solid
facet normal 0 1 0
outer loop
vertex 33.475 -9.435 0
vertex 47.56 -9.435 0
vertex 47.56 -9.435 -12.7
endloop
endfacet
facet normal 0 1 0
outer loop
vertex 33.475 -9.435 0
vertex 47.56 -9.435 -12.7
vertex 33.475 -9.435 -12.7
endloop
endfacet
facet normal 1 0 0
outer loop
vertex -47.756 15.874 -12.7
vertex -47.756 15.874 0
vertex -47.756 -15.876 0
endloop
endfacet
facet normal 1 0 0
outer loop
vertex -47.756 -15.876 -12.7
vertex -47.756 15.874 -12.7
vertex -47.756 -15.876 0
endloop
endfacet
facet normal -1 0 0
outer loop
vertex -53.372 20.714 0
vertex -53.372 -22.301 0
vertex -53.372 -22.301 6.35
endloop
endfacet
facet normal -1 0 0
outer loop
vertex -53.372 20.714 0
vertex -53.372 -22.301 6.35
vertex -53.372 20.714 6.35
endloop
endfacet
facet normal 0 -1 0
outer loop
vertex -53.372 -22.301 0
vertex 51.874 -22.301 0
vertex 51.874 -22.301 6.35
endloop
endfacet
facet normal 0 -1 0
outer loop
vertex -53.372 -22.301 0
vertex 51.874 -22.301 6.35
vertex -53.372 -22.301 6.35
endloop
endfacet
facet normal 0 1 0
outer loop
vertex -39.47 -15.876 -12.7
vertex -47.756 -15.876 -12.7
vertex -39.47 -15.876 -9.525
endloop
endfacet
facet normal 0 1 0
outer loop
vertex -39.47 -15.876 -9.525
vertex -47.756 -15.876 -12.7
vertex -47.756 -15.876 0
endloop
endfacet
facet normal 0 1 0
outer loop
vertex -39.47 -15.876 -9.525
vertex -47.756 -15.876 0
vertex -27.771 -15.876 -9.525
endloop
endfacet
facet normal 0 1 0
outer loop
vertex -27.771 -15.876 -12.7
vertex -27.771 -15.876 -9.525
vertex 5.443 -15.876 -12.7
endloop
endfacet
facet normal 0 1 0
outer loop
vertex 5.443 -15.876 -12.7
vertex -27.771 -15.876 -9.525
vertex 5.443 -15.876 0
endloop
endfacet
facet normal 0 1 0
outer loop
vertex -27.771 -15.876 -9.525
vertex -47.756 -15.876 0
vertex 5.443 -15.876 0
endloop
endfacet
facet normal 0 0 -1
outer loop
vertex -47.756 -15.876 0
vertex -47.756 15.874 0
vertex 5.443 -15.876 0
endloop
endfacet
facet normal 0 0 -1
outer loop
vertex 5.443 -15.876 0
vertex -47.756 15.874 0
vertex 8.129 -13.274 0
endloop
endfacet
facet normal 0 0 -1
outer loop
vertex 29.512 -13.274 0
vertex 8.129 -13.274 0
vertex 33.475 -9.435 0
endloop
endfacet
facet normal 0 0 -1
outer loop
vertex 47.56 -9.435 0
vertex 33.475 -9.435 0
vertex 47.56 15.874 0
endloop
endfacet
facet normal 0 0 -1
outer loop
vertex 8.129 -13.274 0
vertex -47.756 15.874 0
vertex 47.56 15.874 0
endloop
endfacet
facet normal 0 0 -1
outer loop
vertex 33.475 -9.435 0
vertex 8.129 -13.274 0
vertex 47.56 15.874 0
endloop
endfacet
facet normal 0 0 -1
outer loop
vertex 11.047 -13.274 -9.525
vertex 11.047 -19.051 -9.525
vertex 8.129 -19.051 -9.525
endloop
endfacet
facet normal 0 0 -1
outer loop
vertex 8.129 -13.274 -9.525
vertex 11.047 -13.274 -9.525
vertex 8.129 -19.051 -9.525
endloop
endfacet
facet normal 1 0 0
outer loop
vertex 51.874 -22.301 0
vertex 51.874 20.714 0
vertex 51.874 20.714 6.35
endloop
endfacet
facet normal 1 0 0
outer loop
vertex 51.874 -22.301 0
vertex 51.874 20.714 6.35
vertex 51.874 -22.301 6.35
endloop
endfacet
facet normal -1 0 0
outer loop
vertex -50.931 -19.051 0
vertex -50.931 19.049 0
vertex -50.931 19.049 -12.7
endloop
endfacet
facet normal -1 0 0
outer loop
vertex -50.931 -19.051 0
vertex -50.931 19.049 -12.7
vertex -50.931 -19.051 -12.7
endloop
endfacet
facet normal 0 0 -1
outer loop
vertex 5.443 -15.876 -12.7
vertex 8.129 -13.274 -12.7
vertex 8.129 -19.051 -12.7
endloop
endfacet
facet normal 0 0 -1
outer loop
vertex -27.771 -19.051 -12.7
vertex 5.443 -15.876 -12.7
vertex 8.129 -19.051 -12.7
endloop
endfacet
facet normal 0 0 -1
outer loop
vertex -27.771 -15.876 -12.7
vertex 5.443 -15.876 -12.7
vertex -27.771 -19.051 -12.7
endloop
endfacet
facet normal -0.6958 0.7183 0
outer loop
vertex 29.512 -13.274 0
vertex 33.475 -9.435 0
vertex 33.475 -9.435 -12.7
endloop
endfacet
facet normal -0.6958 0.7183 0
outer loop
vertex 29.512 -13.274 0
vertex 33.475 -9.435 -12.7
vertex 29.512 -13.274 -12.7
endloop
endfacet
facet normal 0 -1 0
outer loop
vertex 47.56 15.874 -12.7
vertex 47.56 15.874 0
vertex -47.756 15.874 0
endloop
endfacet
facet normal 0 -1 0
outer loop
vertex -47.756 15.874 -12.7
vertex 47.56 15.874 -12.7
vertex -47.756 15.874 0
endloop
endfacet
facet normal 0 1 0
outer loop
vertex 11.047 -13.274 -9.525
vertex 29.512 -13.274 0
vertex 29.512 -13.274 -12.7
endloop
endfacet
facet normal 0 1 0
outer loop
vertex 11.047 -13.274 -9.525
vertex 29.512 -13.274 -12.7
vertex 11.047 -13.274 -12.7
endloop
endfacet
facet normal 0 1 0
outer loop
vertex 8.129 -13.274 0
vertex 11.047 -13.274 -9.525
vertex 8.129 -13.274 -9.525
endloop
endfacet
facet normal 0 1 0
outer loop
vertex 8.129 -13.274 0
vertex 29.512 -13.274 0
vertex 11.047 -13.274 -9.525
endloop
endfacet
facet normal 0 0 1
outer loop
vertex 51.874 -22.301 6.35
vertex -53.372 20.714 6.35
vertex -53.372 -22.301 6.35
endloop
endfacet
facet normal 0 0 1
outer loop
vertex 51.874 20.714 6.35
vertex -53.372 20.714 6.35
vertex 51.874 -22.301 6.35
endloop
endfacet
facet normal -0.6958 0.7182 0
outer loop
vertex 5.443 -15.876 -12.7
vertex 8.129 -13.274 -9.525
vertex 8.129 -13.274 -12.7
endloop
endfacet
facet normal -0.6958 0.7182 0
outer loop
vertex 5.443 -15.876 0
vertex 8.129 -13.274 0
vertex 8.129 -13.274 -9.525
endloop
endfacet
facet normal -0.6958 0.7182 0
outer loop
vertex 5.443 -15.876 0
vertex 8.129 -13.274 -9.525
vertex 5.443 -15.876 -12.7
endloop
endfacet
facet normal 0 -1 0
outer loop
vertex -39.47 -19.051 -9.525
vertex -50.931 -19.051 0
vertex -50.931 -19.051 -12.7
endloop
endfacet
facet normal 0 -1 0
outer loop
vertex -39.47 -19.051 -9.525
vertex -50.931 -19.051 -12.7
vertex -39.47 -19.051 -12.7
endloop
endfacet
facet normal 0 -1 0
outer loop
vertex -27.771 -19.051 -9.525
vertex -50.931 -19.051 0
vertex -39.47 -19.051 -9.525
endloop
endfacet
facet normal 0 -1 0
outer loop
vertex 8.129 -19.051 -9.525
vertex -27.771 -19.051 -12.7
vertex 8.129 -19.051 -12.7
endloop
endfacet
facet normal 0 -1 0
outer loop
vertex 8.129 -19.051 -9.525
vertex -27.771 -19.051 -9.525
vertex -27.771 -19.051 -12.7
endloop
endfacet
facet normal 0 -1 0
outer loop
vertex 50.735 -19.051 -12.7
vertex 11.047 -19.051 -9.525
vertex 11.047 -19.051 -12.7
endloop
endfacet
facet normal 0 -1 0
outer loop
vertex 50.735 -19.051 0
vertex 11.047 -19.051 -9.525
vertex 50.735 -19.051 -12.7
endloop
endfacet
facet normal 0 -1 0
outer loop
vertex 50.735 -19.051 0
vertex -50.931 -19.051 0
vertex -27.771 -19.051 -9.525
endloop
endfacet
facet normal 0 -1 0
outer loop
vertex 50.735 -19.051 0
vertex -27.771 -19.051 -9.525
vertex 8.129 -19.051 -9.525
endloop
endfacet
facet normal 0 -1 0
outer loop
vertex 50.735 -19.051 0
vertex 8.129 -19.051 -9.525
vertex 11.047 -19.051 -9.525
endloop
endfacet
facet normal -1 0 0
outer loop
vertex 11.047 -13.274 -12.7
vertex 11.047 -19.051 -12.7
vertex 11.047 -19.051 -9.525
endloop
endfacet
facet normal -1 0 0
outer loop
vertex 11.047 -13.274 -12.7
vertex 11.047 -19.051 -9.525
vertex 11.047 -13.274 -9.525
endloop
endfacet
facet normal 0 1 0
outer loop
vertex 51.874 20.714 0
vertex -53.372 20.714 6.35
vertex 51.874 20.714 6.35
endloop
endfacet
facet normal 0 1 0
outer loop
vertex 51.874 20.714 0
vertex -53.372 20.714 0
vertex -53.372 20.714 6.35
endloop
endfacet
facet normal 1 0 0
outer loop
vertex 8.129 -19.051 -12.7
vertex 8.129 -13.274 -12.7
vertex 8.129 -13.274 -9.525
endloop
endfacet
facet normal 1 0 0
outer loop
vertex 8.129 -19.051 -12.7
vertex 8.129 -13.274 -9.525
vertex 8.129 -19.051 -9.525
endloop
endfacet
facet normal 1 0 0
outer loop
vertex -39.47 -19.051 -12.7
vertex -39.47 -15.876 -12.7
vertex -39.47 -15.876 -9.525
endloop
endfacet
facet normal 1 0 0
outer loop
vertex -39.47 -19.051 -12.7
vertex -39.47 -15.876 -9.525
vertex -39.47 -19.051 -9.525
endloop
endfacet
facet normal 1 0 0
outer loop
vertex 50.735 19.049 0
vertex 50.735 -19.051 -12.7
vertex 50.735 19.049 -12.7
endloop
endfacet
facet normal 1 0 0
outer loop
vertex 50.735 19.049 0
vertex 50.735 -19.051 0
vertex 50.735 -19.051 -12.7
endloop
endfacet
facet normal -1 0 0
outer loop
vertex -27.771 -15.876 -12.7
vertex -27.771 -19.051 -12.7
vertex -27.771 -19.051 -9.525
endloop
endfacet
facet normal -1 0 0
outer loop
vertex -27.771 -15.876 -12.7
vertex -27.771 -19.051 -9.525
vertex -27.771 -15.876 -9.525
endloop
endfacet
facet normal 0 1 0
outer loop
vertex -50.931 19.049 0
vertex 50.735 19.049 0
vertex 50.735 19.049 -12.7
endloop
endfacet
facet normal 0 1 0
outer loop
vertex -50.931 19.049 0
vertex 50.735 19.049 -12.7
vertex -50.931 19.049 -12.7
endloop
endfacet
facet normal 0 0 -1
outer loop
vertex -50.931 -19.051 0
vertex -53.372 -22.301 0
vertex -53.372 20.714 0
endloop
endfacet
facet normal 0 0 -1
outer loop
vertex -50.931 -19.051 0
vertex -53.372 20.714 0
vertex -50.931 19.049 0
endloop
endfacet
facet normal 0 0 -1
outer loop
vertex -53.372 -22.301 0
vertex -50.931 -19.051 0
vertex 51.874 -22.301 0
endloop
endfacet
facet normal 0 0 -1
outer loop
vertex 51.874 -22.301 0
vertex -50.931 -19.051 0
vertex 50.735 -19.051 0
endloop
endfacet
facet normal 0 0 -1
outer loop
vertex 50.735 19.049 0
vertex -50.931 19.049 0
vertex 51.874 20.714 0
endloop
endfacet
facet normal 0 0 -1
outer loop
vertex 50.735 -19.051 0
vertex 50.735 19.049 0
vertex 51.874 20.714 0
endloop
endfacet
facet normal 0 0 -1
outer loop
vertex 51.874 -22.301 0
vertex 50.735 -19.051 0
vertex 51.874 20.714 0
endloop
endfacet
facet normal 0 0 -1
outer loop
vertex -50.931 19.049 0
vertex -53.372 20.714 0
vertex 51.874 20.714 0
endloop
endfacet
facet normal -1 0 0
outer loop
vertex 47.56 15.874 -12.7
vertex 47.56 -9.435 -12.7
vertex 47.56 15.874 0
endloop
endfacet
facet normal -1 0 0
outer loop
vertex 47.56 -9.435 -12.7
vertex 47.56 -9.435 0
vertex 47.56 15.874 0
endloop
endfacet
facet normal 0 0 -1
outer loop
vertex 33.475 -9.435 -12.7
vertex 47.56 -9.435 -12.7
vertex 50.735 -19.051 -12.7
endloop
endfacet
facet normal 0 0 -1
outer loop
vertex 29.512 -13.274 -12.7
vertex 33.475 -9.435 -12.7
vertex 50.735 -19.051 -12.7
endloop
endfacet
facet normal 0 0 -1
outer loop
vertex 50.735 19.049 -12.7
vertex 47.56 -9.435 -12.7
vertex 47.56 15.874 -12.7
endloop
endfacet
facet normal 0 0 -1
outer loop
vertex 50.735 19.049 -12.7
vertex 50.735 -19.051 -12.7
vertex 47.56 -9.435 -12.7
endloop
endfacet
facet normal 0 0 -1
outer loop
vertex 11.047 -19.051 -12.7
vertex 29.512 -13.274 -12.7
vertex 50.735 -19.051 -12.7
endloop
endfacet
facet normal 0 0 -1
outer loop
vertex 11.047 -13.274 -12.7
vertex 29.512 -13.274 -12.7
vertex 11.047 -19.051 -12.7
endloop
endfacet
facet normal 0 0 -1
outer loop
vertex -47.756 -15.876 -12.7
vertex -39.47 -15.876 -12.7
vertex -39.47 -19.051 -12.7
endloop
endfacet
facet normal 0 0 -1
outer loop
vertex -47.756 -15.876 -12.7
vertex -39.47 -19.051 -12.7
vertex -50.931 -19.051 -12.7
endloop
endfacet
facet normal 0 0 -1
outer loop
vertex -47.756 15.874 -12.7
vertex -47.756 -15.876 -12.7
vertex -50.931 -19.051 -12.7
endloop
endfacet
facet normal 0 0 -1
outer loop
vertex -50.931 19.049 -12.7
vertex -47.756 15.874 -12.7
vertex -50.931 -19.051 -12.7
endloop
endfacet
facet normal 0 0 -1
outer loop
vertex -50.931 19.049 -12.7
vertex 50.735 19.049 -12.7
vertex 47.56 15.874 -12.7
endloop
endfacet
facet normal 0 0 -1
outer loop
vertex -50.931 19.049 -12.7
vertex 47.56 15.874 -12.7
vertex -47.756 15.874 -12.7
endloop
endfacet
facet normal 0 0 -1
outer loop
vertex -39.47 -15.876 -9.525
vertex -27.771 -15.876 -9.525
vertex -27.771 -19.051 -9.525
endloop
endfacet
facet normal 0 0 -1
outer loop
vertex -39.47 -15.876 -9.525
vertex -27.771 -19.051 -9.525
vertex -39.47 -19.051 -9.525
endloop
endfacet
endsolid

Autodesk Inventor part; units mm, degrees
ref_plane "YZ Plane" through (0, 0, 0) normal (1, 0, 0) x (0, 1, 0)
ref_plane "XZ Plane" through (0, 0, 0) normal (0, 1, 0) x (-1, 0, 0)
ref_plane "XY Plane" through (0, 0, 0) normal (0, 0, 1) x (1, 0, 0)
sketch "Sketch1" plane through (0, 0, 0) normal (0, 0, 1) x (1, 0, 0)
  line L0 (-53.3723, 20.7143) -> (51.8738, 20.7143)
  line L1 (51.8738, 20.7143) -> (51.8738, -22.3009)
  line L2 (51.8738, -22.3009) -> (-53.3723, -22.3009)
  line L3 (-53.3723, -22.3009) -> (-53.3723, 20.7143)
  point P0 (0, 0)
extrude "Extrusion1" add sketch "Sketch1" along normal blind 6.35
sketch "Sketch2" plane through (0, 0, 0) normal (0, 0, -1) x (-1, 0, 0)
  line L0 (-51.8738, 20.7143) -> (53.3723, 20.7143)
  line L1 (53.3723, 20.7143) -> (53.3723, -22.3009)
  line L2 (53.3723, -22.3009) -> (-51.8738, -22.3009)
  line L3 (-51.8738, -22.3009) -> (-51.8738, 20.7143)
  line L4 (-47.5602, 15.8741) -> (47.7562, 15.8741)
  line L5 (47.7562, 15.8741) -> (47.7562, -15.8759)
  line L6 (47.7562, -15.8759) -> (-47.5602, -15.8759)
  line L7 (-47.5602, -15.8759) -> (-47.5602, 15.8741)
  line L8 (-50.7352, 19.0491) -> (50.9312, 19.0491)
  line L9 (50.9312, 19.0491) -> (50.9312, -19.0509)
  line L10 (50.9312, -19.0509) -> (-50.7352, -19.0509)
  line L11 (-50.7352, -19.0509) -> (-50.7352, 19.0491)
  line L12 (53.3723, -22.3009) -> (53.3723, 20.7143) projected
  line L13 (-47.5602, -9.4351) -> (-33.4749, -9.4351)
  line L14 (-33.4749, -9.4351) -> (-29.5119, -13.2742)
  line L15 (-29.5119, -13.2742) -> (-8.1285, -13.2742)
  line L16 (-8.1285, -13.2742) -> (-5.4429, -15.8759)
  point P0 (0, 0)
  dimension "d6" = 3.175
  dimension "d7" = 3.175
  dimension "d8" = 31.75
  dimension "d9" = 3.175
  dimension "d10" = 3.175
extrude "Extrusion2" add sketch "Sketch2" along normal blind 12.7 contours L13 L14 L15 L16 L6 L7 | L8 L9 L10 L11
sketch "Sketch4" plane through (0, 0, -12.7) normal (0, 0, -1) x (-1, 0, 0)
  line L0 (47.7562, -15.8759) -> (-5.4429, -15.8759) projected
  line L1 (27.7708, -15.8759) -> (39.4699, -15.8759)
  line L2 (39.4699, -15.8759) -> (39.4699, -22.2961)
  line L3 (39.4699, -22.2961) -> (27.7708, -22.2961)
  line L4 (27.7708, -22.2961) -> (27.7708, -15.8759)
  line L5 (-11.0473, -12.4096) -> (-8.1285, -12.4096)
  line L6 (-8.1285, -12.4096) -> (-8.1285, -20.4181)
  line L7 (-8.1285, -20.4181) -> (-11.0473, -20.4181)
  line L8 (-11.0473, -20.4181) -> (-11.0473, -12.4096)
  point P0 (-47.5602, -15.8759)
  point P1 (0, 0)
extrude "Extrusion4" cut sketch "Sketch4" against normal blind 3.175
properties part number "NoiseSourceWell"
